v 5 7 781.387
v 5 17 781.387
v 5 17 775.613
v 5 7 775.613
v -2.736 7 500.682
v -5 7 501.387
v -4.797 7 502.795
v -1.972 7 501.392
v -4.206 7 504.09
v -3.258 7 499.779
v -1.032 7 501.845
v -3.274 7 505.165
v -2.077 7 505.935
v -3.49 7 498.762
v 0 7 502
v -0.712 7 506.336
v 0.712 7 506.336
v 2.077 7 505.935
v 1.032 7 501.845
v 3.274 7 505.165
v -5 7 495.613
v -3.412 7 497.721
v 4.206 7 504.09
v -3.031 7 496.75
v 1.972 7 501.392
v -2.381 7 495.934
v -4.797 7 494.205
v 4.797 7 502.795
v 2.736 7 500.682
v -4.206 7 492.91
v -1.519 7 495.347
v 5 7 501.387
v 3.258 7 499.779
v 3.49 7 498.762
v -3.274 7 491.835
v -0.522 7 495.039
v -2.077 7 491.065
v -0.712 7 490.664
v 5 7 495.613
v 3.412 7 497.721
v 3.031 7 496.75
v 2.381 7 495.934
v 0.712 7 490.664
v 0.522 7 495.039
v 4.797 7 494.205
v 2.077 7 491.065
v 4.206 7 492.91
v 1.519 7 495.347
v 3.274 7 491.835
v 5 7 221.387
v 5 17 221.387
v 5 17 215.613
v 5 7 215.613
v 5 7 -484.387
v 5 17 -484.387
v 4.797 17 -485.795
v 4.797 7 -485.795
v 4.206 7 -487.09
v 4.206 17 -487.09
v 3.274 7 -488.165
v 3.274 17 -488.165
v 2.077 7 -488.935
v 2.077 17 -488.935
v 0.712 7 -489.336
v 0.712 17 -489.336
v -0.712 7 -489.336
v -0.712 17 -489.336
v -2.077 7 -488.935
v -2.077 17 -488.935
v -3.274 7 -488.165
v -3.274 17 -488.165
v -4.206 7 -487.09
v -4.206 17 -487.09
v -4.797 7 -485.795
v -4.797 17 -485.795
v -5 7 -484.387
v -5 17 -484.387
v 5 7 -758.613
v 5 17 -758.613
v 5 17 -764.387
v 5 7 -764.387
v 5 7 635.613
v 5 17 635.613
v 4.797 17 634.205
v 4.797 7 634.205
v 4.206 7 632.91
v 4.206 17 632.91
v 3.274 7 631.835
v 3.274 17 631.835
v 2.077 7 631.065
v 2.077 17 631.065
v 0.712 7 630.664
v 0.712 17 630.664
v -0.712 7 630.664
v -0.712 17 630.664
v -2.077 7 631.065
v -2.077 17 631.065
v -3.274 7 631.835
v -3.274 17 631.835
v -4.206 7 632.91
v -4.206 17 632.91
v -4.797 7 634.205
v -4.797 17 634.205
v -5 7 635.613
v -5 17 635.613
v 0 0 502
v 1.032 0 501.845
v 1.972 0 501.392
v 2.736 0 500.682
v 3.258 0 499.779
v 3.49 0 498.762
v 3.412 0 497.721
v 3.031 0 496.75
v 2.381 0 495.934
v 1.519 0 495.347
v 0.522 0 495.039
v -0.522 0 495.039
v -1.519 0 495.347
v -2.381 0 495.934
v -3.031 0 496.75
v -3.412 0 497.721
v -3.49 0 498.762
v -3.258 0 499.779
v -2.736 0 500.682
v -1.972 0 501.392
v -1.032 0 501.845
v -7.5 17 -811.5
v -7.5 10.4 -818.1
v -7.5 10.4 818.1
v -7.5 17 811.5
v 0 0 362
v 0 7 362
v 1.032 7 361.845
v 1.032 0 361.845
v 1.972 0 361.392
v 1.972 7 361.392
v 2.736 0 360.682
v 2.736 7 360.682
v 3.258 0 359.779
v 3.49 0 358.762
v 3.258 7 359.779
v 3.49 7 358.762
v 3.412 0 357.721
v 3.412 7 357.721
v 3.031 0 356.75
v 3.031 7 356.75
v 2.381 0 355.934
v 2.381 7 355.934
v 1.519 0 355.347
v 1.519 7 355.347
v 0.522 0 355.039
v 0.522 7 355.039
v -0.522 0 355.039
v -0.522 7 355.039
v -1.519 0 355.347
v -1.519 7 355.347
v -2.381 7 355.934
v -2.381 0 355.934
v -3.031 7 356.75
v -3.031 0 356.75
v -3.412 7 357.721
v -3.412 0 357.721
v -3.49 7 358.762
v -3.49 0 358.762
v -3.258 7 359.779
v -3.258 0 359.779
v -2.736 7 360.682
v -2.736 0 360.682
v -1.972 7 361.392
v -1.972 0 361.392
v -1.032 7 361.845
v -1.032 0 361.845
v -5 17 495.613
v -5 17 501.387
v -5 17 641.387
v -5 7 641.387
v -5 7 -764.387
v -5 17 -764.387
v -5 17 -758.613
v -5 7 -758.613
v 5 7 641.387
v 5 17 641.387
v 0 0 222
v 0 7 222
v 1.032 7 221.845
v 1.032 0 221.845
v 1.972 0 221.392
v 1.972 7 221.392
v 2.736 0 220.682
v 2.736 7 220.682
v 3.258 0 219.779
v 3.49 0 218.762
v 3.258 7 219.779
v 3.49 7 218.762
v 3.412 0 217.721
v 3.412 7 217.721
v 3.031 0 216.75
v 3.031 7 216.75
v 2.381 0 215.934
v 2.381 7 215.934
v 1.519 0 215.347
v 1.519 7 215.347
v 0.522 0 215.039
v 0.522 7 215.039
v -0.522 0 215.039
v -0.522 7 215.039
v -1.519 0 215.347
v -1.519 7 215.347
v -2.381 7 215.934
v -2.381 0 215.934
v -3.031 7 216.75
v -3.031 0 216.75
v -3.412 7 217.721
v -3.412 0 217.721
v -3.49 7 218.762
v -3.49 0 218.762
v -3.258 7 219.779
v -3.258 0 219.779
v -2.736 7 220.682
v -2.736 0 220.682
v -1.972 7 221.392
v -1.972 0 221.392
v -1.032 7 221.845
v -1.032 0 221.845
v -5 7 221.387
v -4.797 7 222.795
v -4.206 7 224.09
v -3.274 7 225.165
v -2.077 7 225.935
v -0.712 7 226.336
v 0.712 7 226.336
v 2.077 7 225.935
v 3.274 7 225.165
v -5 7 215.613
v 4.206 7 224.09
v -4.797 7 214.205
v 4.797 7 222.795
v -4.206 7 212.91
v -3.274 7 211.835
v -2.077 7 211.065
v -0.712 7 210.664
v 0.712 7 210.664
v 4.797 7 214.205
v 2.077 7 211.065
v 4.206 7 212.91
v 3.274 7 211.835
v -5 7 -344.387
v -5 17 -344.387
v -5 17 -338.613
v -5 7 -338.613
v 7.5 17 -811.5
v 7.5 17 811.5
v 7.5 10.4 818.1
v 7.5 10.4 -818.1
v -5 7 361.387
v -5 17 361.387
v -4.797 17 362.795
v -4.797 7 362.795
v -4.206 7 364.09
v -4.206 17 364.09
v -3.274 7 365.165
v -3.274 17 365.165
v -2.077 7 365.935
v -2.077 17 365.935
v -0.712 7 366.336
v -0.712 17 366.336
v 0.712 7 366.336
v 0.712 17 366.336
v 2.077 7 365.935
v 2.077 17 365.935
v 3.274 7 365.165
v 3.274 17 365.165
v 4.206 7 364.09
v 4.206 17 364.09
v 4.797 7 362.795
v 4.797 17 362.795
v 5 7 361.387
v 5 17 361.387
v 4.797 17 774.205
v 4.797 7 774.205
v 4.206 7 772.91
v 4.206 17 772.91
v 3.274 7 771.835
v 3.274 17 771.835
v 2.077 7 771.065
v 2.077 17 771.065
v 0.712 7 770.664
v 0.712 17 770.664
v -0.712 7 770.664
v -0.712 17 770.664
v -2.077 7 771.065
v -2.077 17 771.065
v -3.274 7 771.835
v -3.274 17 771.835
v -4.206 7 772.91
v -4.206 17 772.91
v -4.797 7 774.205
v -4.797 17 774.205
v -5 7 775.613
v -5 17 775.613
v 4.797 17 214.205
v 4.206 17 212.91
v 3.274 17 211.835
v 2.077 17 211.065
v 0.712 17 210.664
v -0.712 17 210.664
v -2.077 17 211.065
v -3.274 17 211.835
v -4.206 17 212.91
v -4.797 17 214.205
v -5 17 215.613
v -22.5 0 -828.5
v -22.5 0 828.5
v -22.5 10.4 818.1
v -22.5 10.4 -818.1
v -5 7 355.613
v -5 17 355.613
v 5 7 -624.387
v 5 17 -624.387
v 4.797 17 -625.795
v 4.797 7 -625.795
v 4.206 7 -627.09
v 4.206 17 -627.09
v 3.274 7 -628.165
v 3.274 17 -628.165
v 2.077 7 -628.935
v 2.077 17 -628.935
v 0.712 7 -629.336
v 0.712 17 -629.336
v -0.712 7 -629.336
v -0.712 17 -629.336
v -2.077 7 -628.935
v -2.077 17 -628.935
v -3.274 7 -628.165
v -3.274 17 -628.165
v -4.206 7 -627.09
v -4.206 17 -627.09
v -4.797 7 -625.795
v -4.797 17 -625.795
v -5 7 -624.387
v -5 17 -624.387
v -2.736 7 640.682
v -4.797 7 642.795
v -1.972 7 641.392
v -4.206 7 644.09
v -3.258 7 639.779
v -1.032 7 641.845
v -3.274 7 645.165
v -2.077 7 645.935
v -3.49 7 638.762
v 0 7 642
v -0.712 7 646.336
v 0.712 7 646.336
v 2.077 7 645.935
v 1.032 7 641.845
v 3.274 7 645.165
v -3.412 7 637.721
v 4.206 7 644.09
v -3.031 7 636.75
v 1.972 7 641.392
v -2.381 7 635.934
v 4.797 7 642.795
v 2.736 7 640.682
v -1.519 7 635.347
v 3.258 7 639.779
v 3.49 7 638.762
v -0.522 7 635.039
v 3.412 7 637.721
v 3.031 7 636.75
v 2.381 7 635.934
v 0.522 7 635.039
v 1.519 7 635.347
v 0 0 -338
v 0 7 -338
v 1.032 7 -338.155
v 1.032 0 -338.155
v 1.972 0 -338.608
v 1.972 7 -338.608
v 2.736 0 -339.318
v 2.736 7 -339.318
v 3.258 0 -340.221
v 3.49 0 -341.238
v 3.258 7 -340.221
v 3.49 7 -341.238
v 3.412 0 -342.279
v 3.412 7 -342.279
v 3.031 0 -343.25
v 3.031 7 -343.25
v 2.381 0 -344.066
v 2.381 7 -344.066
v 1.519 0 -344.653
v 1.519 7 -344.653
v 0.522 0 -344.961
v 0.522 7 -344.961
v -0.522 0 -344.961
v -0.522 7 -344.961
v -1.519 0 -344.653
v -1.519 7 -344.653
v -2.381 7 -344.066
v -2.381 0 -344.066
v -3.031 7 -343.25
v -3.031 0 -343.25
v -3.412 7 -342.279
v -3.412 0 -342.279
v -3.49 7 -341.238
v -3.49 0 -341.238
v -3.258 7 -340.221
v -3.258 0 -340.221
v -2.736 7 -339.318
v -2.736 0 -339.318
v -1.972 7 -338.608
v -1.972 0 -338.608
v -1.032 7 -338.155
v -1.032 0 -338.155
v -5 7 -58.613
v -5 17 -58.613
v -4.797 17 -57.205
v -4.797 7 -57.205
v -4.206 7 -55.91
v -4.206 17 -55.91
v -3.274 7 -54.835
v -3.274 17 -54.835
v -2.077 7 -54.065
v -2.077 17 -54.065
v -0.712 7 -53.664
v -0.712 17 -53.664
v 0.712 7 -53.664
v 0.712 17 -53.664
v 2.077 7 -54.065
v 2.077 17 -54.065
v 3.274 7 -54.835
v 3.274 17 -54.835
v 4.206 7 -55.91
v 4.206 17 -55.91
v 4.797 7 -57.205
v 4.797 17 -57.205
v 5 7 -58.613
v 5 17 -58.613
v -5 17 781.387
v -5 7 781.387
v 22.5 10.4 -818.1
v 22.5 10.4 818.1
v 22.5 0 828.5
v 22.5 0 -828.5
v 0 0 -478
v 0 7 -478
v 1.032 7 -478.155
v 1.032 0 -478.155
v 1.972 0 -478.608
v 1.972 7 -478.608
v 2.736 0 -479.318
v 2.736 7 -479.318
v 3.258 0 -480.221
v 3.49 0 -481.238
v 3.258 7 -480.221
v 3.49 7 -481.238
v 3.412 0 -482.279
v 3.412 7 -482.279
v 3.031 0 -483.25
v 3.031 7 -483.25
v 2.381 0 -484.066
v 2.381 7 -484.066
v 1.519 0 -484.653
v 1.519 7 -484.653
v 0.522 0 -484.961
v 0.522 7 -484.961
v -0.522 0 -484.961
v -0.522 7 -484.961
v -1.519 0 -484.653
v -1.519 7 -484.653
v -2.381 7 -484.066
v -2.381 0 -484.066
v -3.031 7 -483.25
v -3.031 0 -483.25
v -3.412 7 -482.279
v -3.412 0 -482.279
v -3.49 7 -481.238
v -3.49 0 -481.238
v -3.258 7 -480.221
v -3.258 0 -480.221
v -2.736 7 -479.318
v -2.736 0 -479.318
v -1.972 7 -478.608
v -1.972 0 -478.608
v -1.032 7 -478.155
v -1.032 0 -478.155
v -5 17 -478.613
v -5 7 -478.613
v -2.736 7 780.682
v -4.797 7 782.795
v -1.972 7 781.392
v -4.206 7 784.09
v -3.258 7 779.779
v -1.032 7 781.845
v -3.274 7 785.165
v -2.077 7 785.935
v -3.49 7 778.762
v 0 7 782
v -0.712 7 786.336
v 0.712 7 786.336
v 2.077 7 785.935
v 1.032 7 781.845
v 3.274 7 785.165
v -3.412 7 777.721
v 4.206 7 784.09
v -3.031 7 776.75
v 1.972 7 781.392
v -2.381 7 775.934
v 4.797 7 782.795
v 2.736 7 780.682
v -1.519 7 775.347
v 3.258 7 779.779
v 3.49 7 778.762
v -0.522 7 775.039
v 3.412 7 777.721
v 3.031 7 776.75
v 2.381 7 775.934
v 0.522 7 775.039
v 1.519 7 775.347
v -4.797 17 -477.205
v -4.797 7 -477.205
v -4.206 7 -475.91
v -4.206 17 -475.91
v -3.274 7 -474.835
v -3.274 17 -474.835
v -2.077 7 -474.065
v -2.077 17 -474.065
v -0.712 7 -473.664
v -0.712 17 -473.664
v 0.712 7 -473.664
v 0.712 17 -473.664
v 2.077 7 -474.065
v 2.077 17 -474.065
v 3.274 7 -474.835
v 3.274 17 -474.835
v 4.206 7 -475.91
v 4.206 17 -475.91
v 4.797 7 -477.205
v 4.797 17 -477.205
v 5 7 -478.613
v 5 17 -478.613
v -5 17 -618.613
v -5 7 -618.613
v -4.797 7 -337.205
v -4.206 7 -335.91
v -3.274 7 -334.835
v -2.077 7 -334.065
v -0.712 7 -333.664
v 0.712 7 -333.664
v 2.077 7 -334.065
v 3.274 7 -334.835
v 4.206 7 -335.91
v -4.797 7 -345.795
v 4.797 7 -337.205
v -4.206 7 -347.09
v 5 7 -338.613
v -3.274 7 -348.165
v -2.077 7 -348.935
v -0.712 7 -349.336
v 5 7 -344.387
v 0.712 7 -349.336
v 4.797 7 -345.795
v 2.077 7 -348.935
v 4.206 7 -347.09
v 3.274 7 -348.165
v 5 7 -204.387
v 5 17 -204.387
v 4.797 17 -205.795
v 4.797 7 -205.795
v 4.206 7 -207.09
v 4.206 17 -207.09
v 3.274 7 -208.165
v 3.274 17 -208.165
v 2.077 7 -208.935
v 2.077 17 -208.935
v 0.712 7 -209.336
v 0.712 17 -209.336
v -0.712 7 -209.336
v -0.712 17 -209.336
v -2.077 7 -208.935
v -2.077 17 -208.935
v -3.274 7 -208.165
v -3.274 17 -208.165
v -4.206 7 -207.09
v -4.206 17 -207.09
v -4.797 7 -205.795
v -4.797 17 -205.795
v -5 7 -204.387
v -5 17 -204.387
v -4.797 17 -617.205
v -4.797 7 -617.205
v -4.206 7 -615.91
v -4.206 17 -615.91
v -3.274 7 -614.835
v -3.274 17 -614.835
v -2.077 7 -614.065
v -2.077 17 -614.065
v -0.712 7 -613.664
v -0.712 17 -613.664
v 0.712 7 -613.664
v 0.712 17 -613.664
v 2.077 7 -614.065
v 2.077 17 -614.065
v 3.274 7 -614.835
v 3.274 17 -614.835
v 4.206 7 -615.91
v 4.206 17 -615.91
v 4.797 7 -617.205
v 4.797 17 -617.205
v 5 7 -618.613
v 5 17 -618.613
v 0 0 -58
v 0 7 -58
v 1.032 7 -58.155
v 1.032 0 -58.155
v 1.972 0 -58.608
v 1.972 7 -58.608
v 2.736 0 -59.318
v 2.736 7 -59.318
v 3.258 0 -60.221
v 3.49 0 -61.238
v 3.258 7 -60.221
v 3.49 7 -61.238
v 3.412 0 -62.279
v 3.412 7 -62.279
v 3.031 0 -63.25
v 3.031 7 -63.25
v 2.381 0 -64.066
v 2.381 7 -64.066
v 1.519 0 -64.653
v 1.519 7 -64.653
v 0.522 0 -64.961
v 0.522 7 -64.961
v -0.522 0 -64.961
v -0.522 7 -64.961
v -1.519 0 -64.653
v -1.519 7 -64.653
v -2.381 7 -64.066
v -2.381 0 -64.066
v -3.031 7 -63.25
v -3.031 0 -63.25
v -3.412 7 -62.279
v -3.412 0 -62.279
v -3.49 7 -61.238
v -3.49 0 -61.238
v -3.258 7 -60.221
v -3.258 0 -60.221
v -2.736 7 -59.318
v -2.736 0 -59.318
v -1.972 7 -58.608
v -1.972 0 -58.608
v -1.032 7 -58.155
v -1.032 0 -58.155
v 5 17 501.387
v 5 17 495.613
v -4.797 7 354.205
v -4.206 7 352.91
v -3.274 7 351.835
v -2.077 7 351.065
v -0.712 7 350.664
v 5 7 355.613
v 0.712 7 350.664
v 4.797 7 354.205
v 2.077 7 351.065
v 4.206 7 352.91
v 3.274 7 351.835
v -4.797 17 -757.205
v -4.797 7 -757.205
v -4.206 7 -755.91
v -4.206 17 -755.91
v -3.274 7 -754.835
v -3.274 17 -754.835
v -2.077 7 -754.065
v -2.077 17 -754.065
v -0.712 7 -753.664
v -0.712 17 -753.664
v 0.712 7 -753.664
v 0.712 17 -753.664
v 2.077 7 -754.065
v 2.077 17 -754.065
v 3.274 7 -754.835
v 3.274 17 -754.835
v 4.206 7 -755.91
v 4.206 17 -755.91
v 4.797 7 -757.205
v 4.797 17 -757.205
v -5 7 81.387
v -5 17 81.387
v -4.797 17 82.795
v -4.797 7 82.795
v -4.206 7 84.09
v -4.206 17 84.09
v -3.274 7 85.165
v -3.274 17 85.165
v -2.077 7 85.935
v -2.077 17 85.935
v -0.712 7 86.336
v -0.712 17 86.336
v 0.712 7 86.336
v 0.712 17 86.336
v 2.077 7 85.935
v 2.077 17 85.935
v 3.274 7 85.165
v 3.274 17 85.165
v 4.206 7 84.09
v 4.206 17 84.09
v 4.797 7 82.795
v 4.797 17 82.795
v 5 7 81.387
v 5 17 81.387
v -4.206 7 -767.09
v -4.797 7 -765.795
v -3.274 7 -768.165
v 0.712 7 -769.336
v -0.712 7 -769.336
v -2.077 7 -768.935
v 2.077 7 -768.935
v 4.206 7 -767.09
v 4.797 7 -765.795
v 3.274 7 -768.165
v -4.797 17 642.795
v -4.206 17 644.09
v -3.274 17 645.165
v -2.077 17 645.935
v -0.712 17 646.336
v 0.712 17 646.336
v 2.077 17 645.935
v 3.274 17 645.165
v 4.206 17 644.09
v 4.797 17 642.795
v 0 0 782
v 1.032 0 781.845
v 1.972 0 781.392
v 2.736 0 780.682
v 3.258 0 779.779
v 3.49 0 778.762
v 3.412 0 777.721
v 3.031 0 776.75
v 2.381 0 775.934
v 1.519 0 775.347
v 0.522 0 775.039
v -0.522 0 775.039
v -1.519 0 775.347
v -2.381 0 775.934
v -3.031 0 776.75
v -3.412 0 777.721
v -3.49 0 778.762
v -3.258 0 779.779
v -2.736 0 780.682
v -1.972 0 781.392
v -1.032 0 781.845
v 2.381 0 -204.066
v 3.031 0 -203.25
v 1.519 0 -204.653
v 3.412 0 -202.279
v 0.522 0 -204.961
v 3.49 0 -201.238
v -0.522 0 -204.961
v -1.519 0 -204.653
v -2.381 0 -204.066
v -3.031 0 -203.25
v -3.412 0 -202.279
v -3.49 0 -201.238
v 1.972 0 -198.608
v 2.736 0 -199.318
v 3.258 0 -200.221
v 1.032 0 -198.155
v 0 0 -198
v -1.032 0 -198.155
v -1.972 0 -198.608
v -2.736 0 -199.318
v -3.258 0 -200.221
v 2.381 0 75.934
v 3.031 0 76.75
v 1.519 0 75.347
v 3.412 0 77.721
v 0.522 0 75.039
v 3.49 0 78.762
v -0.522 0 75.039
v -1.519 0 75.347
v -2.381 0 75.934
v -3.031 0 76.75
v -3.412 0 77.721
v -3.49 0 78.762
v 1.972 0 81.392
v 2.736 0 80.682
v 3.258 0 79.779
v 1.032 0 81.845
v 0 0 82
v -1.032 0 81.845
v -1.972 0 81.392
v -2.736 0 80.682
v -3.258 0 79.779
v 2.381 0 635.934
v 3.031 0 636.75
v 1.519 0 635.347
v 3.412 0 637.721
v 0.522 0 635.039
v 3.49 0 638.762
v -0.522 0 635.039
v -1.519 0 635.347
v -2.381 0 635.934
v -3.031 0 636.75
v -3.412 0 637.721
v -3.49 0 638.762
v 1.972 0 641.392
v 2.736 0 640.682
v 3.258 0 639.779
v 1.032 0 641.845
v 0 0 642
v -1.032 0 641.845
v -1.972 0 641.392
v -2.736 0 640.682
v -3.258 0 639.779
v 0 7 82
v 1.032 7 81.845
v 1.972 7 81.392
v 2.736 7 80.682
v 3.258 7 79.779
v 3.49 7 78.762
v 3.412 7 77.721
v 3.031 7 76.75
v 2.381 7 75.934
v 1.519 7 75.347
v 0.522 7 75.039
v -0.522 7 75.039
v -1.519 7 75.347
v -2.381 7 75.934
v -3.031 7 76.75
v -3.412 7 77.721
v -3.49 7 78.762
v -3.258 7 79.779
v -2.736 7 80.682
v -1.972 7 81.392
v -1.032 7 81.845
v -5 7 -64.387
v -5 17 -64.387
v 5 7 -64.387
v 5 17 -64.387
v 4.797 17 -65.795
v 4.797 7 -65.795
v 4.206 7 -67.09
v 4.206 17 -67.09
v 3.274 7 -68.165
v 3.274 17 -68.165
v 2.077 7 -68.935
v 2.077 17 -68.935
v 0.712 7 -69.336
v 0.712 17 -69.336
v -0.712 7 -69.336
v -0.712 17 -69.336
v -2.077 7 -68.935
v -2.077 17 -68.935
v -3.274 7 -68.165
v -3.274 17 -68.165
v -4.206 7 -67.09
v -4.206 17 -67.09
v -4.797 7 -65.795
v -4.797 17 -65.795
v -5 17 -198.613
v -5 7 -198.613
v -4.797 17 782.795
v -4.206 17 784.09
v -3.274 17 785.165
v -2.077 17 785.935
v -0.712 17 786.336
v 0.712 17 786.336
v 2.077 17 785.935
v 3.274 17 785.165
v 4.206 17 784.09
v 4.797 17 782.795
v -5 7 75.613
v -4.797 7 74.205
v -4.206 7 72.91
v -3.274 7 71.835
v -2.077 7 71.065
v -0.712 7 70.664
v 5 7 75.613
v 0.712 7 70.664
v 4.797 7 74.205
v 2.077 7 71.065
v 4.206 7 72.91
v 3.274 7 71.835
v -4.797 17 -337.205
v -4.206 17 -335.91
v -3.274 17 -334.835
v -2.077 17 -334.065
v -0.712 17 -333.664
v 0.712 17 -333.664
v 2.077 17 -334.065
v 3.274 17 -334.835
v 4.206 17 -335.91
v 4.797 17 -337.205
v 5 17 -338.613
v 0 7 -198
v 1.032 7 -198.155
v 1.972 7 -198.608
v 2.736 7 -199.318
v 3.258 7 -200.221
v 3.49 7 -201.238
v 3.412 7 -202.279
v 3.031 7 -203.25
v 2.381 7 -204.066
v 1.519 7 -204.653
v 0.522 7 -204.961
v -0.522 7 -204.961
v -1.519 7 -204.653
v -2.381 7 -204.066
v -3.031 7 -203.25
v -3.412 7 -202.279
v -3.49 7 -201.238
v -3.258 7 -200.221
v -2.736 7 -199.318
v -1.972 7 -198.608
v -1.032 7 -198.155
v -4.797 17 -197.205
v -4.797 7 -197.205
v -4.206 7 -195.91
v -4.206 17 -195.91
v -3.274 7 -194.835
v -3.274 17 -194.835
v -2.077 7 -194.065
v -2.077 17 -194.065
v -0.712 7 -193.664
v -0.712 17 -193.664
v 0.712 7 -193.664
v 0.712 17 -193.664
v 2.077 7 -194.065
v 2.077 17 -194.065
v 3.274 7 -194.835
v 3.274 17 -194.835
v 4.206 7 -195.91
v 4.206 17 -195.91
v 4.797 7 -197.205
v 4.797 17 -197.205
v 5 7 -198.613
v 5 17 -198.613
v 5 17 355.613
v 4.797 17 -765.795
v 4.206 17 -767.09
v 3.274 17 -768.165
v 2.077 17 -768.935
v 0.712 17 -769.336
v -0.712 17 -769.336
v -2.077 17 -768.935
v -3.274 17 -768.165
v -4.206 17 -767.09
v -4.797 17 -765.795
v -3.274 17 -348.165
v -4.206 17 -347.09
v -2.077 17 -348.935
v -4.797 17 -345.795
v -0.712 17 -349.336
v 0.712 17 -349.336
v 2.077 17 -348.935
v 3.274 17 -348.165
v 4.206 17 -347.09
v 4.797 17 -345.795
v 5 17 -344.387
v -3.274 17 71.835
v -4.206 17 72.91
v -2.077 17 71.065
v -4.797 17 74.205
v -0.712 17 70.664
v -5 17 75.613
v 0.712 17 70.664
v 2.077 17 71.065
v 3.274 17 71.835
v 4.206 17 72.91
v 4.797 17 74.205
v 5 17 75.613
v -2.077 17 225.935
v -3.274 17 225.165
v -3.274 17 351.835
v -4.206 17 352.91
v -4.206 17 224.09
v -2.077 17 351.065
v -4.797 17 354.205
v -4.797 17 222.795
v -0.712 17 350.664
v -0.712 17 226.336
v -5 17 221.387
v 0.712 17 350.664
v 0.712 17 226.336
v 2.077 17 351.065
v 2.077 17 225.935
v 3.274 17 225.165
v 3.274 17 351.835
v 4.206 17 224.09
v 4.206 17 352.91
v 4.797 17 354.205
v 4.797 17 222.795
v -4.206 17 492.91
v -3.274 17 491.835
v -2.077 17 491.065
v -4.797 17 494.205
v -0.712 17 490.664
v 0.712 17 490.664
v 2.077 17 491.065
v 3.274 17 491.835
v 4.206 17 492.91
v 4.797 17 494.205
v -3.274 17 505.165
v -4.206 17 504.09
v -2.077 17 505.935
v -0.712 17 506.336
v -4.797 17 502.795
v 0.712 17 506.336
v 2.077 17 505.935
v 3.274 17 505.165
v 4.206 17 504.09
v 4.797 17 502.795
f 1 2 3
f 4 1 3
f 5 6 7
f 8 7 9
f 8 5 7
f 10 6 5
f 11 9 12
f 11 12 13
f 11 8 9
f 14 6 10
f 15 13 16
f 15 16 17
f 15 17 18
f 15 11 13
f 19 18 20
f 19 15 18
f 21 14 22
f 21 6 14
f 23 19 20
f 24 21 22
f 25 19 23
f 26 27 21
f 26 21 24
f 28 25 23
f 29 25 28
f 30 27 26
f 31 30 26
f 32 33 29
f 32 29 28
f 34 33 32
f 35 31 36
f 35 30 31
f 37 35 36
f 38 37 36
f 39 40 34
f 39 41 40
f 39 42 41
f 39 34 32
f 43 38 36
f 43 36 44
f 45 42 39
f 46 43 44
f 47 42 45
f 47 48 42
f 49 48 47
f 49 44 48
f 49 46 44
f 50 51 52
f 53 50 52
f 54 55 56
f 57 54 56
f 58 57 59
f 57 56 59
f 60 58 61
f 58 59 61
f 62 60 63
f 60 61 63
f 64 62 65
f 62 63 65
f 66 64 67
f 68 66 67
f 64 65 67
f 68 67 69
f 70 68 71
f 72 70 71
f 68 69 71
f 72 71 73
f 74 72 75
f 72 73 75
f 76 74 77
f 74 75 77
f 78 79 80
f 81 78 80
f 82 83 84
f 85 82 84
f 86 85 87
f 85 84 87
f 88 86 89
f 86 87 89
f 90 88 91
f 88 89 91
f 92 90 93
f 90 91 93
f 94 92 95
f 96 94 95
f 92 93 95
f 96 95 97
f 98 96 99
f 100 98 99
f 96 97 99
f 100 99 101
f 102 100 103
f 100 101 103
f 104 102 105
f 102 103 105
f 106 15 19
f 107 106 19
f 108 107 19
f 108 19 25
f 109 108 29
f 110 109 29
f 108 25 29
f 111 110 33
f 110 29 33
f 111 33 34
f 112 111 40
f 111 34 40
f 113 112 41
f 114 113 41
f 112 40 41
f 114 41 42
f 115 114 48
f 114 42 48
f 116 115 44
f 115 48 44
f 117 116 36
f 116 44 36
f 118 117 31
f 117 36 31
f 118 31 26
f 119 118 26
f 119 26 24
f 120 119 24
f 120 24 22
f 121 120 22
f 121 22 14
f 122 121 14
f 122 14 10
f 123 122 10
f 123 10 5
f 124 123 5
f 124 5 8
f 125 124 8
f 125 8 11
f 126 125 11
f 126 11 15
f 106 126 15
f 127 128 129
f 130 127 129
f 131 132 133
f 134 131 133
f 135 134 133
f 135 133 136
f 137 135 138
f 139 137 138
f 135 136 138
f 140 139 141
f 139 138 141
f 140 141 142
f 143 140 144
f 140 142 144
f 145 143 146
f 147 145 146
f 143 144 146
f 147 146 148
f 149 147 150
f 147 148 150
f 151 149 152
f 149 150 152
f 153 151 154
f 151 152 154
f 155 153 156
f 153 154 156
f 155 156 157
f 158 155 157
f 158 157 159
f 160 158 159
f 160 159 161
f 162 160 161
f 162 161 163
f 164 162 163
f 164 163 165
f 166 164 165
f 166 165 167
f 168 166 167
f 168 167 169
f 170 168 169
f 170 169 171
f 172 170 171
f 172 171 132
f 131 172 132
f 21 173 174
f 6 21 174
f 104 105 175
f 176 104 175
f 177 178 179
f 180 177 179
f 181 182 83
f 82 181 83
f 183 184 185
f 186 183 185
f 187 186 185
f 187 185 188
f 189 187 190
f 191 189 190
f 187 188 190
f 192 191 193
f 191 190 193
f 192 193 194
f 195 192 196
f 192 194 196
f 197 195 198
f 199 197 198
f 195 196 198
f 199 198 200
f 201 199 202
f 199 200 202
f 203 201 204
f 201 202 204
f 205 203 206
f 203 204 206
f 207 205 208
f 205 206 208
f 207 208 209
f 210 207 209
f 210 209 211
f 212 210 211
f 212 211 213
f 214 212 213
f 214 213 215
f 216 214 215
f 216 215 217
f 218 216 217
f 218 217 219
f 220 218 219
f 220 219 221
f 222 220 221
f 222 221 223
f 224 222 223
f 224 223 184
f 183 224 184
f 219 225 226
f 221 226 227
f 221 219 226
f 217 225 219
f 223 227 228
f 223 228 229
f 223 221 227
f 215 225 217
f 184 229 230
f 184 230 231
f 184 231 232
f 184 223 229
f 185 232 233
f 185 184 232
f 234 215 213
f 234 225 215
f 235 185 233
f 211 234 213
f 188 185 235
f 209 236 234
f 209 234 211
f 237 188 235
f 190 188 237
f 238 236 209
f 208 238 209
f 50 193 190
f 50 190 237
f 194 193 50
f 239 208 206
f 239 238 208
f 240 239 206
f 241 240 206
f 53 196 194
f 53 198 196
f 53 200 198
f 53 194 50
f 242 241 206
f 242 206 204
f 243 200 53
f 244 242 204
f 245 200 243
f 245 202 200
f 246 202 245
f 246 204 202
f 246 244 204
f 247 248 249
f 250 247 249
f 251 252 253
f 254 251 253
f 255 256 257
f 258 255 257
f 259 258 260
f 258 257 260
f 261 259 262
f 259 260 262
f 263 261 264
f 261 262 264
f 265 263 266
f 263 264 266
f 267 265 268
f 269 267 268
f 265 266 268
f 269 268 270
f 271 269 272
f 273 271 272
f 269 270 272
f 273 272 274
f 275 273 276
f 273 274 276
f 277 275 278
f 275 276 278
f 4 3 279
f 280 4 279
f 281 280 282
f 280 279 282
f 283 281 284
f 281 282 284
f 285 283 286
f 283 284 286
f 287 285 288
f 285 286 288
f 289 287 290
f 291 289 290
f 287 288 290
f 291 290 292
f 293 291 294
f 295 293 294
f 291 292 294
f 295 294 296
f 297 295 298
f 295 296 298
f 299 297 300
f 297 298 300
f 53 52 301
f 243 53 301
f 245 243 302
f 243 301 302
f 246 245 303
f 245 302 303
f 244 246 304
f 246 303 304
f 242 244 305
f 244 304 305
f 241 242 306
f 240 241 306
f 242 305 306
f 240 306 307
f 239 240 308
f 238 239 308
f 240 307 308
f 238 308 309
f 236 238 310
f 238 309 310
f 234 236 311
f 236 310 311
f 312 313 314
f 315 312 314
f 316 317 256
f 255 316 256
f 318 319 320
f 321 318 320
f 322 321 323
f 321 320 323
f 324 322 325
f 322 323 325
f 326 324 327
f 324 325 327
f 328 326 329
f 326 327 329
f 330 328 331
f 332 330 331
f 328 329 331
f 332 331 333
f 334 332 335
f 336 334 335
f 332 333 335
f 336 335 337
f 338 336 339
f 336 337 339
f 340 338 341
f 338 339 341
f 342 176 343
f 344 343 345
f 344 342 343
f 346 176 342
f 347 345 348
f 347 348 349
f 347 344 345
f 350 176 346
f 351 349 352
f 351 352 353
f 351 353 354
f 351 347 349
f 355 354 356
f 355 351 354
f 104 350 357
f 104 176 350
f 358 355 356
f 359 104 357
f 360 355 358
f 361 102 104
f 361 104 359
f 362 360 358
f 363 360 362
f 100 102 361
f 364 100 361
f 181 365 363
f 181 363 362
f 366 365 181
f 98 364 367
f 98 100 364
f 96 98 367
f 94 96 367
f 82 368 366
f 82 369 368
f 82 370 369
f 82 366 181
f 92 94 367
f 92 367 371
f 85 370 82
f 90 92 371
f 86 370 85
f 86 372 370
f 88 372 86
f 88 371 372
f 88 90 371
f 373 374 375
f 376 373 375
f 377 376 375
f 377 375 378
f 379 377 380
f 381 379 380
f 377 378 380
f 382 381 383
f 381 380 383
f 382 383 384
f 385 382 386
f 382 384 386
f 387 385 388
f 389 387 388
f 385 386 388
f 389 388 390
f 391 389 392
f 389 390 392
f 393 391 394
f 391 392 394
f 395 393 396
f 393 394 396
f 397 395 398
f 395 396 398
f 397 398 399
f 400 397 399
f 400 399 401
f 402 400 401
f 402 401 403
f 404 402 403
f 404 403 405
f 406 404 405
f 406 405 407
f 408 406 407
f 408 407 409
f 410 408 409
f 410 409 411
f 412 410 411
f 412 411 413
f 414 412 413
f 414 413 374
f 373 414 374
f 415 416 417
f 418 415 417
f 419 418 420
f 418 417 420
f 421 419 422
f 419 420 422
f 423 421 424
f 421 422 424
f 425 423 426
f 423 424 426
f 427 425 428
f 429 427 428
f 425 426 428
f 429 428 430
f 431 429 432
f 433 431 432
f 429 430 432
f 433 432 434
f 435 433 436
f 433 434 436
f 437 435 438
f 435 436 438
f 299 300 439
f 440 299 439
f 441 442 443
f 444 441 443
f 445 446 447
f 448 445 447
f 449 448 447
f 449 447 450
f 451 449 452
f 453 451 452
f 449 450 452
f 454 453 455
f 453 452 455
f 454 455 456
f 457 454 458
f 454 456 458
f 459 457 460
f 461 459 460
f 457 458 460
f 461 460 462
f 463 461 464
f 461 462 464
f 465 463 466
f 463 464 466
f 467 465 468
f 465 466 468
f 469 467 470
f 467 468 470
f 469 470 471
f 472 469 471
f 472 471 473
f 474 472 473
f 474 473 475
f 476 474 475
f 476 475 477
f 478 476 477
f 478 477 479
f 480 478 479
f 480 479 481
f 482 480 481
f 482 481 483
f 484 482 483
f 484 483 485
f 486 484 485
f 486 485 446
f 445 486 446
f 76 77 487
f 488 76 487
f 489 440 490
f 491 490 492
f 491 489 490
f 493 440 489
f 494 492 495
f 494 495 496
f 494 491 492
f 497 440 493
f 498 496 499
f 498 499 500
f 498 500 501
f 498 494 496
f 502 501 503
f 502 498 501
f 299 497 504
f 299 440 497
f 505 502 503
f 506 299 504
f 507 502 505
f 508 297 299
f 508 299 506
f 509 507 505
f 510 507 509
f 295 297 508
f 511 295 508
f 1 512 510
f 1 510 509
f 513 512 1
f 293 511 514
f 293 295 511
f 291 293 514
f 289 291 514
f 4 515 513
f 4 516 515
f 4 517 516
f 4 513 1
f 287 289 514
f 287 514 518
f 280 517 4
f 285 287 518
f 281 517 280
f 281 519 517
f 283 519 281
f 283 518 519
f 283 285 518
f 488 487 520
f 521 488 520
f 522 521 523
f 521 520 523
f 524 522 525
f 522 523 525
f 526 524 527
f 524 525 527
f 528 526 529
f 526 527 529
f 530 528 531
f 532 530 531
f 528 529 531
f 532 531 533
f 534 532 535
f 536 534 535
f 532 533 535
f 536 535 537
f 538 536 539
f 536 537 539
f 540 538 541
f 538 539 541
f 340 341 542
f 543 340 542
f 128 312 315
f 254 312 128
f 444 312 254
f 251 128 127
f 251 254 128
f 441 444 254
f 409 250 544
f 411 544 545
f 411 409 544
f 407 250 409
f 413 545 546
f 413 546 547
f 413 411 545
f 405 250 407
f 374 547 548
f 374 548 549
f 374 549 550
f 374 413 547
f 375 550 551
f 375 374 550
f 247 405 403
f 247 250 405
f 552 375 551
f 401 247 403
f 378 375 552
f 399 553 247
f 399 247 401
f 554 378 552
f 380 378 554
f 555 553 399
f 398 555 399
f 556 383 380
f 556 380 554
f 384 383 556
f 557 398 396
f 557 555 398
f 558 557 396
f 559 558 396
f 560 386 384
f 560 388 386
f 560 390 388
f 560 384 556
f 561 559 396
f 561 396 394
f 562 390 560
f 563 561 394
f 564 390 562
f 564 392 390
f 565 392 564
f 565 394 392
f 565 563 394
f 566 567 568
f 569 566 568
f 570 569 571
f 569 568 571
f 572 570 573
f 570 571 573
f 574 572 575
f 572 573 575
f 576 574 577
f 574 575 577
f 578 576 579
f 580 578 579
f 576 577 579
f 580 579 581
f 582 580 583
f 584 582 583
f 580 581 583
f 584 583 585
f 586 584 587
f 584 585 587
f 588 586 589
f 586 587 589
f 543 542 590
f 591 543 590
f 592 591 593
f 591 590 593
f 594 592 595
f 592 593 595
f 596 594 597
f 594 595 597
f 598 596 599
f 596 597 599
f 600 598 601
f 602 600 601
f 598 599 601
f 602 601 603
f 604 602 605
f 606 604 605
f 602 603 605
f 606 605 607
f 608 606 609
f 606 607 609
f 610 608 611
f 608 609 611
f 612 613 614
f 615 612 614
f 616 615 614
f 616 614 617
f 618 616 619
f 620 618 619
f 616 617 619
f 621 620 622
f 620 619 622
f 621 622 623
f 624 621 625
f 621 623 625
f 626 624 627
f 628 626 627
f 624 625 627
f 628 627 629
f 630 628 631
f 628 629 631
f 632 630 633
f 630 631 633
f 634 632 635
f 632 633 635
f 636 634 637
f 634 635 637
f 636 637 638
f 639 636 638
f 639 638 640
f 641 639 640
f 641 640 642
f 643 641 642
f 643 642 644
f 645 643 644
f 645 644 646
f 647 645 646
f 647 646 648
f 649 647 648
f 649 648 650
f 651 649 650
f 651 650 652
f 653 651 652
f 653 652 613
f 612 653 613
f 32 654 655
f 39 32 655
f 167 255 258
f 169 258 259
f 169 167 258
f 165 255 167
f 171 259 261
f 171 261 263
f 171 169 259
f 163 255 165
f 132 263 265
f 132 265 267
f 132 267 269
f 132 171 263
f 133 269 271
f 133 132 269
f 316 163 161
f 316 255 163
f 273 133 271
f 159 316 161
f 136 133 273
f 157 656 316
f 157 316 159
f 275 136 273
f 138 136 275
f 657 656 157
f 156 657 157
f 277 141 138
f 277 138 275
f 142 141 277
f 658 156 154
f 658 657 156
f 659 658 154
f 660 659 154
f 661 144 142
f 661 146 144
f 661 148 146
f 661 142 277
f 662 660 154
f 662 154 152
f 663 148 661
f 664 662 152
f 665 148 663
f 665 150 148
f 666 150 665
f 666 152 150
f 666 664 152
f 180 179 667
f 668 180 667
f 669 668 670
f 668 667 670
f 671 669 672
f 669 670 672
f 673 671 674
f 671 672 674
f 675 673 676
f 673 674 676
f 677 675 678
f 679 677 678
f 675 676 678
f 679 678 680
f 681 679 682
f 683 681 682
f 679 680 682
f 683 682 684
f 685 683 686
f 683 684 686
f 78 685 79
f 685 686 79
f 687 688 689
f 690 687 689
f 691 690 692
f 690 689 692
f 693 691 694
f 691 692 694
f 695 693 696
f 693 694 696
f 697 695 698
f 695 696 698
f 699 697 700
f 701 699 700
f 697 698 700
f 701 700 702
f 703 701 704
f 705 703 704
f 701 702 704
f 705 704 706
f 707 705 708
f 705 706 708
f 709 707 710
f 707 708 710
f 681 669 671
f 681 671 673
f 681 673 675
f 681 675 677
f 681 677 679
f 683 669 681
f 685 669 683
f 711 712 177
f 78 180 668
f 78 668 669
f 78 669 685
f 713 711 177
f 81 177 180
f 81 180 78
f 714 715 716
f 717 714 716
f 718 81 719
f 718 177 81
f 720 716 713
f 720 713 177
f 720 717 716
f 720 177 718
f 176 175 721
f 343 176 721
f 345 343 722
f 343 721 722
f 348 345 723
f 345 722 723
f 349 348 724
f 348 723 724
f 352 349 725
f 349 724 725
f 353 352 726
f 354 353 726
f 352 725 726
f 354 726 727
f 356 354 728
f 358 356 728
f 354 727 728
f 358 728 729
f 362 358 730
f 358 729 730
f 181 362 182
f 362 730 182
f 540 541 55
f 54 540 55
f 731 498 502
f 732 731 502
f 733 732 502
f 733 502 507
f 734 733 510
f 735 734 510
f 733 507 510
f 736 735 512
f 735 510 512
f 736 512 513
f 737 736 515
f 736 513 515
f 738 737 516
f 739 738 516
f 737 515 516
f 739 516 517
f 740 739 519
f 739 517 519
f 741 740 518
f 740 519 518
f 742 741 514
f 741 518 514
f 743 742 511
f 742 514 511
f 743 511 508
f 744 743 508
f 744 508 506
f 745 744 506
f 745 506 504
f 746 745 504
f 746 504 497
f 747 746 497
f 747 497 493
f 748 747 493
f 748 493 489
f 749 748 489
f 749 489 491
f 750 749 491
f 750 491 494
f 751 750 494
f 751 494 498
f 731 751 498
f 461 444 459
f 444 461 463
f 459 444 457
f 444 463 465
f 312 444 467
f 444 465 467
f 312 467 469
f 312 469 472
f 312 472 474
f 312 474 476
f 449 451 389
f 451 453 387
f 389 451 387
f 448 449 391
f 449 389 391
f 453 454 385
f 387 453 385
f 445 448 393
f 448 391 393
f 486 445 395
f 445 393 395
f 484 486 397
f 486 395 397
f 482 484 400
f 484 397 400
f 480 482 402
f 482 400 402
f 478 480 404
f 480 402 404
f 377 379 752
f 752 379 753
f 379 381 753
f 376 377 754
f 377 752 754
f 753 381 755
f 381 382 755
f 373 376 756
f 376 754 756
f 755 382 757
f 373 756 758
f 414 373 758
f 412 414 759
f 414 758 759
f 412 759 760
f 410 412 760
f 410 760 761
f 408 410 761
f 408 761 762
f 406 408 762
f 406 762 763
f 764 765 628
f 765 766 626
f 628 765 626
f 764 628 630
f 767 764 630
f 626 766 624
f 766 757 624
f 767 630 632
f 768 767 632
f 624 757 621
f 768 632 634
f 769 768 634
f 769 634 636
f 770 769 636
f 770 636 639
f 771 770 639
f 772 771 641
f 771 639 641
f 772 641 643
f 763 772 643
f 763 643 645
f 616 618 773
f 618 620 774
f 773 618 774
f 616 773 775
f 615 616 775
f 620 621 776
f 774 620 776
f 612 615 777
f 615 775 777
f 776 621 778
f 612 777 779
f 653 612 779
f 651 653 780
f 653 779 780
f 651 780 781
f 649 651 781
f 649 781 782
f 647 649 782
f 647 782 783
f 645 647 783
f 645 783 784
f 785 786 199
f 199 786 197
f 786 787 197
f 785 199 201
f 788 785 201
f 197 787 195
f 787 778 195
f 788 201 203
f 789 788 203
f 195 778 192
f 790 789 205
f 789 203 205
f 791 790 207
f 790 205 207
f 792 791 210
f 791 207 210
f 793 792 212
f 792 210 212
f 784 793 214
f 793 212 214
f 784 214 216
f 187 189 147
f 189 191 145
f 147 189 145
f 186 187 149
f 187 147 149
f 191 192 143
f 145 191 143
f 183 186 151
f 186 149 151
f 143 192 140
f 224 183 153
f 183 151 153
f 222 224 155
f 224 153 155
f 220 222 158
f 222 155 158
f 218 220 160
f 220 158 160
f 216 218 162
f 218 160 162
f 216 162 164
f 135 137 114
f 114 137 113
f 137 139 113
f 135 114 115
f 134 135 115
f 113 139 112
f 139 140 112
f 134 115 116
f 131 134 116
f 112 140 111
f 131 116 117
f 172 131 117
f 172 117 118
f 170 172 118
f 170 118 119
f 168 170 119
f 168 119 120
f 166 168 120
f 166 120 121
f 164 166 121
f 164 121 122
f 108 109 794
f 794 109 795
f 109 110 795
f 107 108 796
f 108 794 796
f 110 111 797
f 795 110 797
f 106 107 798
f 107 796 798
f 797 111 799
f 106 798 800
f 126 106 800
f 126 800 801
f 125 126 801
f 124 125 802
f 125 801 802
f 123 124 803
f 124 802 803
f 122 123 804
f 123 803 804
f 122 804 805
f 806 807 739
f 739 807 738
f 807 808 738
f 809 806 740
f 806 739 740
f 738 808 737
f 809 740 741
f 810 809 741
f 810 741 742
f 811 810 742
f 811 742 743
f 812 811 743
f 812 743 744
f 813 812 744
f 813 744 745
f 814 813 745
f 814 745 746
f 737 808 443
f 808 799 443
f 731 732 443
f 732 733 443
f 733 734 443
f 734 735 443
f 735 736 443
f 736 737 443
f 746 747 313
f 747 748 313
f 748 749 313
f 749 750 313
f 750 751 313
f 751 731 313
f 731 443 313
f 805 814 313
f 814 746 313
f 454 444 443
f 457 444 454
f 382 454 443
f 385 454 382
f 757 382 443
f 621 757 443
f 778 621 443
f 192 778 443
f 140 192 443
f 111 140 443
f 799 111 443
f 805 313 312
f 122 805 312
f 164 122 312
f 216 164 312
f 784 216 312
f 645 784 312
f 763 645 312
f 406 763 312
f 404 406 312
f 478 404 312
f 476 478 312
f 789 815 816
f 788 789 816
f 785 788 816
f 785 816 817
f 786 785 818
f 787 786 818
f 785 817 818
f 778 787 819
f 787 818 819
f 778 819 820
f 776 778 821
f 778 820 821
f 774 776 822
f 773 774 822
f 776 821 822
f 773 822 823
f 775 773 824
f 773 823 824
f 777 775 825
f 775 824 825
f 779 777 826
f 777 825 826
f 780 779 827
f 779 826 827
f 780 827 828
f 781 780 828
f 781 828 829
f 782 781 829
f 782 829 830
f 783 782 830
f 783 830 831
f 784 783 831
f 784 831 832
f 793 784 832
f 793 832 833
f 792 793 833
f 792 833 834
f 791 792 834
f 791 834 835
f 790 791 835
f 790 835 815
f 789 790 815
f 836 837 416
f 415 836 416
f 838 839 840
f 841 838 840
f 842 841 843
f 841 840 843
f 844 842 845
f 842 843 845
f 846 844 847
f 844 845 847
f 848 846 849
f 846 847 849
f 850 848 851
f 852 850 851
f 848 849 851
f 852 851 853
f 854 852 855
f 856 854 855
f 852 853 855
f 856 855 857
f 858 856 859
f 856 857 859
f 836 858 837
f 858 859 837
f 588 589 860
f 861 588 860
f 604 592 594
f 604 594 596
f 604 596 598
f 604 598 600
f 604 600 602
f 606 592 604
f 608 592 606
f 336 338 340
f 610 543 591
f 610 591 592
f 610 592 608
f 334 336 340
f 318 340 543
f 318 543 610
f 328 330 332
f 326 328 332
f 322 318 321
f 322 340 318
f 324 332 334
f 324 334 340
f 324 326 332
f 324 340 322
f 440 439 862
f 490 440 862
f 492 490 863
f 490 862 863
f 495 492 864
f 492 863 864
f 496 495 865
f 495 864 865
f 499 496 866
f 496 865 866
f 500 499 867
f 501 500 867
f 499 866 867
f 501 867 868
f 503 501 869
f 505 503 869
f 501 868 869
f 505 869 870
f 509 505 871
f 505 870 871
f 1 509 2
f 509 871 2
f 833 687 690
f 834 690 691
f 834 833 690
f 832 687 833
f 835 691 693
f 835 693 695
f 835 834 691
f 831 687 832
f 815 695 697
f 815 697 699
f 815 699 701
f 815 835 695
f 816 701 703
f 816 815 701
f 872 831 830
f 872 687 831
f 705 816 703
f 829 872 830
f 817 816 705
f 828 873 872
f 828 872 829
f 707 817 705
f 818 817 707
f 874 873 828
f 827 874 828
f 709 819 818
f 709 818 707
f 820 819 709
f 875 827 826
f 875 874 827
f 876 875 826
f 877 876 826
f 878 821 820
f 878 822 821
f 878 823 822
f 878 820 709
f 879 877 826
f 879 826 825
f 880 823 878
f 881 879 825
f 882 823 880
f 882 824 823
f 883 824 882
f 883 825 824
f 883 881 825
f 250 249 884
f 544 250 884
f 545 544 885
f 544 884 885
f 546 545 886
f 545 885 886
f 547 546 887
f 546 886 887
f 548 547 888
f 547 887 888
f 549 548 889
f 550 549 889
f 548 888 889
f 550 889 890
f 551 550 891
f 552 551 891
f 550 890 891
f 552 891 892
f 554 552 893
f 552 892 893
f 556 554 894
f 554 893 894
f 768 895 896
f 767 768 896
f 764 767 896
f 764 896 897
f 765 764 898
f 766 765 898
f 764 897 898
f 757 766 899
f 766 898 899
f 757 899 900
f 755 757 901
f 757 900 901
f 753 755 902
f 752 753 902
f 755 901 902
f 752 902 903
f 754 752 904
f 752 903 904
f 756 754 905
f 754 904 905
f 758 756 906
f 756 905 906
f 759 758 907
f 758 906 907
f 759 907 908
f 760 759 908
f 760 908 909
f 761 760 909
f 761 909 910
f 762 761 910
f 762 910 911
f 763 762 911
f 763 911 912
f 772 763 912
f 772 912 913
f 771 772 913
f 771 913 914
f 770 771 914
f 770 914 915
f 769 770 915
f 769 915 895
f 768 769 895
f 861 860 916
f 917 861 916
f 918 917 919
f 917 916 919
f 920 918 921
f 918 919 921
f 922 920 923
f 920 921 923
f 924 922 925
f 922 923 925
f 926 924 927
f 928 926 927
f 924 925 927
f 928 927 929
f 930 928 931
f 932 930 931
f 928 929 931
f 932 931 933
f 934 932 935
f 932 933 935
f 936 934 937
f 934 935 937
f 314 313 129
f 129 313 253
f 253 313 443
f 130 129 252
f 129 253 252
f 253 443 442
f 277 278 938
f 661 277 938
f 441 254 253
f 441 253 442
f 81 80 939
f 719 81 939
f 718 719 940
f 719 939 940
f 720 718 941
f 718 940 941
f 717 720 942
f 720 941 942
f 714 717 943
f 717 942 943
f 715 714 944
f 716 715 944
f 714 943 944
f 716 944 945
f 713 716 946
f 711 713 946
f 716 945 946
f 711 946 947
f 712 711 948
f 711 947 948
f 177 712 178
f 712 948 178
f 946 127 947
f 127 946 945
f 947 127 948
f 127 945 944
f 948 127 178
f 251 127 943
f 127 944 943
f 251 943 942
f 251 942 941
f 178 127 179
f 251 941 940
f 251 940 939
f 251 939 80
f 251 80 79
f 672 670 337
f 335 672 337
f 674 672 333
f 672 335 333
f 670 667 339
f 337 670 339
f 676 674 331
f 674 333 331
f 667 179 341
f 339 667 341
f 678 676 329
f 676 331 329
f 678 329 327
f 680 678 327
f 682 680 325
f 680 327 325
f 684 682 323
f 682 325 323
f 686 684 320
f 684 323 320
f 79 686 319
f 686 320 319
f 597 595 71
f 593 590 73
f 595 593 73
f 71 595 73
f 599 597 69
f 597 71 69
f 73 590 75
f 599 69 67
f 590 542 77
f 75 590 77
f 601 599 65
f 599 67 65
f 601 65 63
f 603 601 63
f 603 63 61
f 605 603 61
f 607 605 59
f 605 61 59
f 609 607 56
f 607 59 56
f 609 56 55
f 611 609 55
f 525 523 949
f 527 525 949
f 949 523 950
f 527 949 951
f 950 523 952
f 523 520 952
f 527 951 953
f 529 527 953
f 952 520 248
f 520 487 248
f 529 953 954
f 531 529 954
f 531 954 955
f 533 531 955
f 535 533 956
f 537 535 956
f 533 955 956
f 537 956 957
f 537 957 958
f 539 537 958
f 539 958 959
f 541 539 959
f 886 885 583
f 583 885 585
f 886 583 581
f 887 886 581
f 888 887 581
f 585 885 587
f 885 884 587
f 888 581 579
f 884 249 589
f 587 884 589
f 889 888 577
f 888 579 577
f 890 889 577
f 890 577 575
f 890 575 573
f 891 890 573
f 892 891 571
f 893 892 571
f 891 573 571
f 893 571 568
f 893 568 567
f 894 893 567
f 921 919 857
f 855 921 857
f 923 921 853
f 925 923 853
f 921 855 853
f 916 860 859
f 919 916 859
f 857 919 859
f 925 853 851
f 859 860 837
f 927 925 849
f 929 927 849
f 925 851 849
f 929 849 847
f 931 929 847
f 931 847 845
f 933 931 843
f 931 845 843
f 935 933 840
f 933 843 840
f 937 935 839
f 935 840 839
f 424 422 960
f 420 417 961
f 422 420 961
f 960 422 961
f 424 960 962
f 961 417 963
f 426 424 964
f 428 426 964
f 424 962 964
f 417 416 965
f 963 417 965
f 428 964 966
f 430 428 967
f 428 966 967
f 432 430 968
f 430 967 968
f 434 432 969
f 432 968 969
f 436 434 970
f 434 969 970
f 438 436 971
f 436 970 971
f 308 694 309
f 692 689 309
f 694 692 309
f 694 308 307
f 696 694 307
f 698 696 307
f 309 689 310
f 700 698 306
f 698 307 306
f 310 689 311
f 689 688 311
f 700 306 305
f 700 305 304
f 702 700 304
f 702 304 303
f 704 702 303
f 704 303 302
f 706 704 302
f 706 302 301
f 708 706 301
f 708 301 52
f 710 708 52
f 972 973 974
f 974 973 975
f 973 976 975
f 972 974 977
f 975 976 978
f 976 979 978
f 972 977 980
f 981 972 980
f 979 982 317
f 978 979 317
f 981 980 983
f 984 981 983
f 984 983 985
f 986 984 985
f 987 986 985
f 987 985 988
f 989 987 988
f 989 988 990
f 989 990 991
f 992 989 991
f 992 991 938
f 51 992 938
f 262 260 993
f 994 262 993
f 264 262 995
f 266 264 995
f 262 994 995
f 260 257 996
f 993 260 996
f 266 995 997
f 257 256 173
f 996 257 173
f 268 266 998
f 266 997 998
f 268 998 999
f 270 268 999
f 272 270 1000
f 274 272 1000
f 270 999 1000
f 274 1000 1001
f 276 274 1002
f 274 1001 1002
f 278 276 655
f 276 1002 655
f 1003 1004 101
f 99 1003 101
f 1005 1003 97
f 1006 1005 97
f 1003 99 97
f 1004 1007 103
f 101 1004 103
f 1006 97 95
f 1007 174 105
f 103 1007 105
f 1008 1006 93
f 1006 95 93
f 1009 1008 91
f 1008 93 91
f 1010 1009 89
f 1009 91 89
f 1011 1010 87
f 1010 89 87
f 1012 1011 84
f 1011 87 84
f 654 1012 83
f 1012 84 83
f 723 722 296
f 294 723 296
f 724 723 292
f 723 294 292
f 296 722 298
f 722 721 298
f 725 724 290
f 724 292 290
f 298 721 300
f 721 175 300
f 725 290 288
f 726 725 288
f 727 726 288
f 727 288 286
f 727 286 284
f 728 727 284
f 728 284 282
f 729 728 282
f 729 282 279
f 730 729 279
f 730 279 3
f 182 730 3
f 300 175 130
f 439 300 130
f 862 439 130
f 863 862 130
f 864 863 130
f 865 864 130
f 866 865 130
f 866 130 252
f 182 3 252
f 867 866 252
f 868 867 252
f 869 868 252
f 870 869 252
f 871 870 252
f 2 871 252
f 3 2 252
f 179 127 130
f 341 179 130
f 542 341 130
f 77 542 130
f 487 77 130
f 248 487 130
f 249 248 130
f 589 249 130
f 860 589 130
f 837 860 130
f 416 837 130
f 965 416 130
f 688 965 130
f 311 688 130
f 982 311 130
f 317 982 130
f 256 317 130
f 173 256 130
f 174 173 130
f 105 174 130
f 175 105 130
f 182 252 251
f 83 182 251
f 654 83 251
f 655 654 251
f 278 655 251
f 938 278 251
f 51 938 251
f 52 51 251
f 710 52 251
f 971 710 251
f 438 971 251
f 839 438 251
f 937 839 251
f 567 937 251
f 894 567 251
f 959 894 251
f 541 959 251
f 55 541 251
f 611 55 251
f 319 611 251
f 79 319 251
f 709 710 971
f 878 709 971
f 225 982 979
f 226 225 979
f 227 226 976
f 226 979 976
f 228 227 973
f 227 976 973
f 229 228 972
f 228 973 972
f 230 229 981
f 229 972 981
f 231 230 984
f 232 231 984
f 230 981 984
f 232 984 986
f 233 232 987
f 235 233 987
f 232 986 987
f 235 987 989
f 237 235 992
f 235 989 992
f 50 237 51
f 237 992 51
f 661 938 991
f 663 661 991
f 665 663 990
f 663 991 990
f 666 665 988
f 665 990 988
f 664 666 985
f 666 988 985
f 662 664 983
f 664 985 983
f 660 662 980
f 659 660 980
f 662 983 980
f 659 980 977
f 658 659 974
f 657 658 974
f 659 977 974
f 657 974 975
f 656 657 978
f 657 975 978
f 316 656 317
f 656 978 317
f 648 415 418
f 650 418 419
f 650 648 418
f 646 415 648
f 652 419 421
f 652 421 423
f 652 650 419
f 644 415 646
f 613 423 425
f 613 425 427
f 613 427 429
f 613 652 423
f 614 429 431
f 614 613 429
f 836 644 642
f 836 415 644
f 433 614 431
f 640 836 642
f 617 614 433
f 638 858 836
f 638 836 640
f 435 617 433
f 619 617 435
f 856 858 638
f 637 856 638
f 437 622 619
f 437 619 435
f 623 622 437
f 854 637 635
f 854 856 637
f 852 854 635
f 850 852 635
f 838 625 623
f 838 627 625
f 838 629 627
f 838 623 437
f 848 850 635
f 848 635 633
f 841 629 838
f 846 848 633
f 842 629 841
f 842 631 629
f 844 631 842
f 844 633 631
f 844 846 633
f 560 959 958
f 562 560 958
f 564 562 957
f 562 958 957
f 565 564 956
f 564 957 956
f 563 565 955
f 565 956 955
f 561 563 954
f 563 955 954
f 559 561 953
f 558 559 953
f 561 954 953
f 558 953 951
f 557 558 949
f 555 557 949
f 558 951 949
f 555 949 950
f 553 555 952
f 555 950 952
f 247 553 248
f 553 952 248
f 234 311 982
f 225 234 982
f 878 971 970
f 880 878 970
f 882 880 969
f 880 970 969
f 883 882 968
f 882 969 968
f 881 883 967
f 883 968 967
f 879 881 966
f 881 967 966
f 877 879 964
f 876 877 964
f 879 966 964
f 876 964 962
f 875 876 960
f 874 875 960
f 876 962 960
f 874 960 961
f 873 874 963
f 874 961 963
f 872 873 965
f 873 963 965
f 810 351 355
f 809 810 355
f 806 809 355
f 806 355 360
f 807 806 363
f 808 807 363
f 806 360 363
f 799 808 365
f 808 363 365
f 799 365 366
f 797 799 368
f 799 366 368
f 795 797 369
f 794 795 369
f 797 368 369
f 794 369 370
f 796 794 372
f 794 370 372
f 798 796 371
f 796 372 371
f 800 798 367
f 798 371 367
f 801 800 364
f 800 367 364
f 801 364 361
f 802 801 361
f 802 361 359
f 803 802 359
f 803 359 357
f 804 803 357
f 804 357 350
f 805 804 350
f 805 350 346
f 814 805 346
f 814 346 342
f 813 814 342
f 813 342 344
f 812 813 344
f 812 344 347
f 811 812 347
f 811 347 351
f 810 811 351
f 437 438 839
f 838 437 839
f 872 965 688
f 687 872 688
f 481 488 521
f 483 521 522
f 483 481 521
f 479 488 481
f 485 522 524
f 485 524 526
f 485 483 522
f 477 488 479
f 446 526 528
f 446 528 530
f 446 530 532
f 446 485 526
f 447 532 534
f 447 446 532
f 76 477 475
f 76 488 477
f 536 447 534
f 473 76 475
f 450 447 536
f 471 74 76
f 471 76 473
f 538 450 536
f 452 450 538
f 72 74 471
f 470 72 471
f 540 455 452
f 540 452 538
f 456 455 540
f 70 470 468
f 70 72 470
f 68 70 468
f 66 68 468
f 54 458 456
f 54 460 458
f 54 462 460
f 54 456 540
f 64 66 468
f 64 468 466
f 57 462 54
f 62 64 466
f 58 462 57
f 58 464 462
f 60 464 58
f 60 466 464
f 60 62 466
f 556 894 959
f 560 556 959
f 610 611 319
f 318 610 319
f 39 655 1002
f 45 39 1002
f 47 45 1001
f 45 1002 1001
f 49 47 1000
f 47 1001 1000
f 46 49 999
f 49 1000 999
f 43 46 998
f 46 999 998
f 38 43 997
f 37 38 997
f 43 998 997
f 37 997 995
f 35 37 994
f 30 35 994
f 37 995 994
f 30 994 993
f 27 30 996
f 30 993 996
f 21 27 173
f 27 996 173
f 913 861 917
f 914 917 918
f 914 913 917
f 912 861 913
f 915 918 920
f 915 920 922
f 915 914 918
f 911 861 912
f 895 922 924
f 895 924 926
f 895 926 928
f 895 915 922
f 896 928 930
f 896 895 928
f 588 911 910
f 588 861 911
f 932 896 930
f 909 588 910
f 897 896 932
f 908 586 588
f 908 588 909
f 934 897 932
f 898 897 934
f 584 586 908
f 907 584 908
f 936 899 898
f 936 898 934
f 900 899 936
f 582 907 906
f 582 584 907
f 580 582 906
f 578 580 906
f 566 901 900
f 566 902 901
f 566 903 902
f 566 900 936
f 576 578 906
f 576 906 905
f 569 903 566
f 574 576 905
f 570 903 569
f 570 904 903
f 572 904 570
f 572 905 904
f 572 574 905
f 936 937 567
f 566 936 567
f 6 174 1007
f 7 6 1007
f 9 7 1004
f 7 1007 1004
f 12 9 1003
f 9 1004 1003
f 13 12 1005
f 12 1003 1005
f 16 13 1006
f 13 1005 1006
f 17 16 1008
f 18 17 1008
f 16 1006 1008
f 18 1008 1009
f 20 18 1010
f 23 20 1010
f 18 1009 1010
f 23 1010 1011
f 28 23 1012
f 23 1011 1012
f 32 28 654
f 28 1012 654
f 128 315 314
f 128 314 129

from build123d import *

# Parameters (mm, degrees)
EXTRUDE_1_DEPTH        = 828.5
SKETCH_2_R             = 3.5
CUT_EXTRUDE_1_DEPTH    = 829.979794687
CUT_EXTRUDE_2_DEPTH    = 830.895324725
CUT_EXTRUDE_3_DEPTH    = 10
PATTERN_LINEAR_1_COUNT = 12
PATTERN_LINEAR_1_PITCH = 140


with BuildPart() as part:
    # Эскиз1 → Бобышка-Вытянуть1 (new, symmetric)
    with BuildSketch(Plane.XY):
        Polygon((22.5, 0), (-22.5, 0), (-22.5, 10.4), (-7.5, 10.4), (-7.5, 17), (7.5, 17), (7.5, 10.4), (22.5, 10.4), align=None)
    extrude(amount=EXTRUDE_1_DEPTH, both=True)

    # Эскиз2 → Вырез-Вытянуть1 (cut, through all)
    with BuildSketch(Plane(origin=(0, 17, 0), x_dir=(1, 0, 0), z_dir=(0, 1, 0))):
        with Locations(Location((0, -778.5, 0), (0, 0, 270))):
            Circle(SKETCH_2_R)
        with Locations(Location((0, -638.5, 0), (0, 0, 270))):
            Circle(SKETCH_2_R)
        with Locations(Location((0, -498.5, 0), (0, 0, 270))):
            Circle(SKETCH_2_R)
        with Locations(Location((0, -358.5, 0), (0, 0, 270))):
            Circle(SKETCH_2_R)
        with Locations(Location((0, -218.5, 0), (0, 0, 270))):
            Circle(SKETCH_2_R)
        with Locations(Location((0, -78.5, 0), (0, 0, 270))):
            Circle(SKETCH_2_R)
        with Locations(Location((0, 61.5, 0), (0, 0, 270))):
            Circle(SKETCH_2_R)
        with Locations(Location((0, 201.5, 0), (0, 0, 270))):
            Circle(SKETCH_2_R)
        with Locations(Location((0, 341.5, 0), (0, 0, 270))):
            Circle(SKETCH_2_R)
        with Locations(Location((0, 481.5, 0), (0, 0, 270))):
            Circle(SKETCH_2_R)
    extrude(amount=-CUT_EXTRUDE_1_DEPTH, mode=Mode.SUBTRACT)

    # Эскиз5 → Вырез-Вытянуть2 (cut, through all)
    with BuildSketch(Plane(origin=(22.5, 0, 0), x_dir=(0, 0, -1), z_dir=(1, 0, 0))):
        Polygon((-828.5, 0), (-811.5, 17), (-828.5, 17), align=None)
        Polygon((828.5, 17), (828.5, 0), (811.5, 17), align=None)
    extrude(amount=-CUT_EXTRUDE_2_DEPTH, mode=Mode.SUBTRACT)

    # Эскиз6 → Вырез-Вытянуть3 (cut)
    with BuildSketch(Plane(origin=(0, 17, 0), x_dir=(1, 0, 0), z_dir=(0, 1, 0))):
        with BuildLine():
            Line((-5, -775.613248654), (-5, -781.386751346))
            ThreePointArc((-5, -781.386751346), (0, -786.386751346), (5, -781.386751346))
            Line((5, -781.386751346), (5, -775.613248654))
            ThreePointArc((5, -775.613248654), (0, -770.613248654), (-5, -775.613248654))
        make_face()
    cut_extrude_3 = extrude(amount=-CUT_EXTRUDE_3_DEPTH, mode=Mode.SUBTRACT)

    # Линейный массив1: Вырез-Вытянуть3 ×12
    with Locations(*[(0, 0, -i * PATTERN_LINEAR_1_PITCH) for i in range(1, PATTERN_LINEAR_1_COUNT)]):
        add(cut_extrude_3, mode=Mode.SUBTRACT)


solid = part.part
